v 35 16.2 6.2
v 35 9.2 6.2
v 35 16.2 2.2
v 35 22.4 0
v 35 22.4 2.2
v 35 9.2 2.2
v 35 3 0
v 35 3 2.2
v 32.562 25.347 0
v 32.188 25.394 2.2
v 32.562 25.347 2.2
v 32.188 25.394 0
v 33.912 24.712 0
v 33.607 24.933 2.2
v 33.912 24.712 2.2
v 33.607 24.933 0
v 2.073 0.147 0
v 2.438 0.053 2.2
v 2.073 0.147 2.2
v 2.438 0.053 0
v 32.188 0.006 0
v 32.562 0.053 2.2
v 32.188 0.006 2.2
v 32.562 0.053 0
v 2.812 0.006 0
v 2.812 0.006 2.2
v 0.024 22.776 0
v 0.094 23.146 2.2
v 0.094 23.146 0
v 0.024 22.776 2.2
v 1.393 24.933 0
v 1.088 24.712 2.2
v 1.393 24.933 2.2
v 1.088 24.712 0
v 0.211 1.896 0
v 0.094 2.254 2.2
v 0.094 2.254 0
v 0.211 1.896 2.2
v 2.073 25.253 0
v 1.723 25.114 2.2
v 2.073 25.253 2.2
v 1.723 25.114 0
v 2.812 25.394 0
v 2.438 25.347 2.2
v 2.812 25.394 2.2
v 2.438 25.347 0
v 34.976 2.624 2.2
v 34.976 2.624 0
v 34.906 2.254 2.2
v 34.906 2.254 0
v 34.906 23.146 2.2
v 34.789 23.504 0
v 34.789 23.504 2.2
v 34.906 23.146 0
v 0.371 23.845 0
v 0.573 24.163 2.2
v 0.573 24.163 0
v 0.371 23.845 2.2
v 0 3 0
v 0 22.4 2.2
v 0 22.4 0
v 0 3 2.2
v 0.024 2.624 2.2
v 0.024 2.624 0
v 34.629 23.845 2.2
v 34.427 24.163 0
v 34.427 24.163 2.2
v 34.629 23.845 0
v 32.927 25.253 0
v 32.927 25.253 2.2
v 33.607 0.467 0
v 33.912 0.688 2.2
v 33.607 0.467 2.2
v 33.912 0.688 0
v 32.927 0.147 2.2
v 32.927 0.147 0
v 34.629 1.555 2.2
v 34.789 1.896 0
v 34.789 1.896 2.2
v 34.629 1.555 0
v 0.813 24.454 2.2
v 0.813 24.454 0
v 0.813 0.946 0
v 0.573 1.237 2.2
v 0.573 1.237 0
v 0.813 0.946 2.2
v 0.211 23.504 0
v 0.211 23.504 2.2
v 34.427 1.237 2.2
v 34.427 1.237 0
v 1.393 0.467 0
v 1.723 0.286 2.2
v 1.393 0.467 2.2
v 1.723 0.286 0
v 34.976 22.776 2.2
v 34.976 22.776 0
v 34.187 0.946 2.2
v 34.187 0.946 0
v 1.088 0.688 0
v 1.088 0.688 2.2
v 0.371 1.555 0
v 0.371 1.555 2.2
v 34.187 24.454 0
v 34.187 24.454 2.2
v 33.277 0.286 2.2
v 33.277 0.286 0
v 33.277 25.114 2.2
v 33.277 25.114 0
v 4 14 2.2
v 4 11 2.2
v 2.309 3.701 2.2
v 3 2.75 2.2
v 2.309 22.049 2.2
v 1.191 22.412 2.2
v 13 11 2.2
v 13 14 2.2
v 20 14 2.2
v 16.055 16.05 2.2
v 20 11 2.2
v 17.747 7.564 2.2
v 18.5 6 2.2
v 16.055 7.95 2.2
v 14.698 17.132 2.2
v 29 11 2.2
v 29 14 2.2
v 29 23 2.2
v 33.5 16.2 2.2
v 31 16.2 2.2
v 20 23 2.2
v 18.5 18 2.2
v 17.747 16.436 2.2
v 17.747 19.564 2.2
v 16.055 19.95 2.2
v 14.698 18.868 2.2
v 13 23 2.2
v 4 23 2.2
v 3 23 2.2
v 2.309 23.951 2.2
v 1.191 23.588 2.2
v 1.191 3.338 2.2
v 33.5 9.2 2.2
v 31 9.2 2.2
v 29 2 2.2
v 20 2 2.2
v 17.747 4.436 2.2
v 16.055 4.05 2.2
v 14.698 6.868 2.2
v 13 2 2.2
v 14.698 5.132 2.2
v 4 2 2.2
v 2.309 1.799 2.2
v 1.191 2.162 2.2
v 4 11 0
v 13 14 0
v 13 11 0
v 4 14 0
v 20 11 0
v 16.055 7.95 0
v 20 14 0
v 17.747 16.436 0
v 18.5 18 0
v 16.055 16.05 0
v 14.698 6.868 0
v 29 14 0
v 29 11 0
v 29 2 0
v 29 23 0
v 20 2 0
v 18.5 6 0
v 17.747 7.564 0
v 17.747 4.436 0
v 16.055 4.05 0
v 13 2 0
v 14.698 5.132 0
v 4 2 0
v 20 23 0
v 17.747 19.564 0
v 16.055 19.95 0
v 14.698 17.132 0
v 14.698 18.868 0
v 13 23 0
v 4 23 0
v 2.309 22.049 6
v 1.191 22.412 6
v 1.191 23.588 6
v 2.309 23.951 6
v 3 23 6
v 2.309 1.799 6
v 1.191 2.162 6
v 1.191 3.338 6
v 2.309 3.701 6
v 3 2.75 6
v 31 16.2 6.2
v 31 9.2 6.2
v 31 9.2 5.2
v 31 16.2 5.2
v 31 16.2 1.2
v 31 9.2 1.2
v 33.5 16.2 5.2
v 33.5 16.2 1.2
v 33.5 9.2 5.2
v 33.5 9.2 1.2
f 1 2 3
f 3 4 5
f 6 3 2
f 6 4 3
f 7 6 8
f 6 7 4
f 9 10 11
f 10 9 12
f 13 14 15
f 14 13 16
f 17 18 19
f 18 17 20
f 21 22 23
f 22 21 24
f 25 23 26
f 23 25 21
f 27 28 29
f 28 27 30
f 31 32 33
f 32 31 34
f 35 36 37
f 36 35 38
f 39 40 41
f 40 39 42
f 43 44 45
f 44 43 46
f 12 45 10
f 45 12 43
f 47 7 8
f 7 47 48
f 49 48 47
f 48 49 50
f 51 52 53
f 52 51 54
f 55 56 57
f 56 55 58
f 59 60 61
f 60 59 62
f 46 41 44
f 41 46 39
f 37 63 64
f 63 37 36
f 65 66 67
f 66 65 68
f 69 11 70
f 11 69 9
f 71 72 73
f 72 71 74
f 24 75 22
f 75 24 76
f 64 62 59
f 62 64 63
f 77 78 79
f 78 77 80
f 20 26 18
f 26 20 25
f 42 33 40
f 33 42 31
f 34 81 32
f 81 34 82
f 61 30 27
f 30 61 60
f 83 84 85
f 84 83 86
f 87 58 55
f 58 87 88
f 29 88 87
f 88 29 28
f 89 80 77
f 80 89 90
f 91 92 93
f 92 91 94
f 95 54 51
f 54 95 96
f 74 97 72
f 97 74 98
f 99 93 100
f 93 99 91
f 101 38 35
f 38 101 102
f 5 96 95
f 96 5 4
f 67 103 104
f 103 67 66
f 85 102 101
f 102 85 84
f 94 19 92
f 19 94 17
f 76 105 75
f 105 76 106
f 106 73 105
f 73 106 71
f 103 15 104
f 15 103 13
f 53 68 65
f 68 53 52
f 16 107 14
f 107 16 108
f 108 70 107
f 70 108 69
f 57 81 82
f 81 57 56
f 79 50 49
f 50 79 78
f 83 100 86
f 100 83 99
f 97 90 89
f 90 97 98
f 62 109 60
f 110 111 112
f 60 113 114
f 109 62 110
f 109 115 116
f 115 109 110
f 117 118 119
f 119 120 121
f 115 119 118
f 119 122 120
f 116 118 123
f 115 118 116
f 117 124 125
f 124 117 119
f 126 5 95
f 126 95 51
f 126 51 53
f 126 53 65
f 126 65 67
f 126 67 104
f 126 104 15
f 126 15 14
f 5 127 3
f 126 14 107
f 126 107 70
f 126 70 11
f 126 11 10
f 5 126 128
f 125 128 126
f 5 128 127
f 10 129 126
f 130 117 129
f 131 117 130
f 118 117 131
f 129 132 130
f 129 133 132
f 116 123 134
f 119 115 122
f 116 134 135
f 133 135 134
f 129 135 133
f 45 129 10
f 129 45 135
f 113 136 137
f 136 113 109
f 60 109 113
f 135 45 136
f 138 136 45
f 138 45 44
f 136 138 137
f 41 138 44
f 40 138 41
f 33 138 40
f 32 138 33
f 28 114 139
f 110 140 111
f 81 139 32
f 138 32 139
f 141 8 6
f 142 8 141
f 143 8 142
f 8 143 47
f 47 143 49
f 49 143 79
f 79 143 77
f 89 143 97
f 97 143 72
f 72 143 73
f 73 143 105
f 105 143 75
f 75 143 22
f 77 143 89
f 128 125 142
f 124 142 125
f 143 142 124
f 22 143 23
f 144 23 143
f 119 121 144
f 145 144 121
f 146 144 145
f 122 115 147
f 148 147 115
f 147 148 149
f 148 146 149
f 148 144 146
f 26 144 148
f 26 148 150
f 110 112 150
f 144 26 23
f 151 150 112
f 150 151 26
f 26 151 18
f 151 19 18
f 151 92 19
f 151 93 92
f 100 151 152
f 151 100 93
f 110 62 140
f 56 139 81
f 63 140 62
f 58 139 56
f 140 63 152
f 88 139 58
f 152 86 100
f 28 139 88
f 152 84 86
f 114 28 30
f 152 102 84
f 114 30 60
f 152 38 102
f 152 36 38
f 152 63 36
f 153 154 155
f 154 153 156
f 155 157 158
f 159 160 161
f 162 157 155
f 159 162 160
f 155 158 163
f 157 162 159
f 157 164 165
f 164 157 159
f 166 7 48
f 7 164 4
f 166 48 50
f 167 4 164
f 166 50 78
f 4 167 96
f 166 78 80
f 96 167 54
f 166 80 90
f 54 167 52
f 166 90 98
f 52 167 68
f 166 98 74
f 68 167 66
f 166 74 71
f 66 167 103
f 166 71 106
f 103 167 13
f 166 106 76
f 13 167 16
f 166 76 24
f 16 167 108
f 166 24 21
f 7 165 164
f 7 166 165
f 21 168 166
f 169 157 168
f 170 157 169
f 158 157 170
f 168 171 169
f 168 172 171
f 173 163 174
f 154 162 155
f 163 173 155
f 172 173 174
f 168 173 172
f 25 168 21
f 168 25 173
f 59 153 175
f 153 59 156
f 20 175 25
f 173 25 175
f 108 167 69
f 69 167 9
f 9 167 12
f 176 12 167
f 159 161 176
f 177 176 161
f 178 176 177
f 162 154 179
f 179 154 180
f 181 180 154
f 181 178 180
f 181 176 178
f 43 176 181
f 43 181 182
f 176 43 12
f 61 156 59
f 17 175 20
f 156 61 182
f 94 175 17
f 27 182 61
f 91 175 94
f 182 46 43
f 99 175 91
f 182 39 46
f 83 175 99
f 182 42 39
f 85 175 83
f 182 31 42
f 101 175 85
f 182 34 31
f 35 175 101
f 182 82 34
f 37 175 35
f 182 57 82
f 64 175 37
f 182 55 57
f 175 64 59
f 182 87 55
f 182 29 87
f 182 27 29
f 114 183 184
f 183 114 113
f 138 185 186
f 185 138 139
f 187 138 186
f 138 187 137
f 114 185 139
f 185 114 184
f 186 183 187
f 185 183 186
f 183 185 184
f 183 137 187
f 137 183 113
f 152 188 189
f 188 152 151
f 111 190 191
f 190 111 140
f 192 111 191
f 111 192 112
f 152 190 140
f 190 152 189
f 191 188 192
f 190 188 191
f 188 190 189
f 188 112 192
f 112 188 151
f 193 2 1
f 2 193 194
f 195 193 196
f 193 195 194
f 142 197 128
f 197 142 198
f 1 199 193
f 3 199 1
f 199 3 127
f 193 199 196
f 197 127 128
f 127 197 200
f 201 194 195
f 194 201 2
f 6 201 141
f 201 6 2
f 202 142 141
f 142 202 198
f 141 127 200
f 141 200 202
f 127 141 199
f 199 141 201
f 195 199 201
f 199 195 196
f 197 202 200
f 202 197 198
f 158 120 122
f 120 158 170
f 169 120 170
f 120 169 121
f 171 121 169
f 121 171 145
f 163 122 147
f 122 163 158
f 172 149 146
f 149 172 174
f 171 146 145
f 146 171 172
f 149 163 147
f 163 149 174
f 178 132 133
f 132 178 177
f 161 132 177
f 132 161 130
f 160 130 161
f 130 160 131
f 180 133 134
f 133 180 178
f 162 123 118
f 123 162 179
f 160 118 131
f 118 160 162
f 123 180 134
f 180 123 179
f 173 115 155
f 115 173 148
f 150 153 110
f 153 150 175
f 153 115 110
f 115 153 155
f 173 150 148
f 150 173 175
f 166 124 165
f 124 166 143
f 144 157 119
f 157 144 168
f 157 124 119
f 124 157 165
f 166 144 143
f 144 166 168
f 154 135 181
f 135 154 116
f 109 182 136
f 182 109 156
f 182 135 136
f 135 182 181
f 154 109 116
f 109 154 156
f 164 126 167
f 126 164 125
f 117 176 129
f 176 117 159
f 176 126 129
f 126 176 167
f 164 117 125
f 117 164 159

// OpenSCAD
// Adafruit Ultimate GPS Breakout Mounting Cip 
//
//  I printed in PLA .4
//
//  Push the GPS board on the clip then onto the studs
//
//  This script used stuff 
//  I found on Thingiverse
//
//  Round corners for Openscad - Tutorial
//  by WilliamAAdams, published	 Jun 15, 2011
//  https://www.thingiverse.com/thing:9347
//


use <MCAD/boxes.scad>;
//cube([34,25.4,1.2]);
difference(){
union(){
    //base
		translate([3,3,0])
		miniround([35,25.4,1.2],3);

    //studs
    translate([2,23,0])
    cylinder(r=1,h=6);
    translate([2,2.75,0])
    cylinder(r=1,h=6);

		//clip
    translate([31,9.2,0])
		cube([4,7,6.2]);
}
    //hollow clip
		translate([31,9.2,1.2])
		cube([2.5,7,4]);

    //screw holes
    translate([16.5,6,0])
    cylinder(r=2,h=6);
    translate([16.5,18,0])
    cylinder(r=2,h=6);

    //reduce material
  	translate([4,2,0])
	  cube(9,14,2);
  	translate([20,2,0])
	  cube(9,14,2);
  	translate([4,14,0])
	  cube(9,18,2);
  	translate([20,14,0])
	  cube(9,18,2);

}


module miniround(size, radius)
{
$fn=50;
x = size[0]-radius*2;
y = size[1]-radius*2;

minkowski()
{
cube(size=[x,y,size[2]]);
cylinder(r=radius);
}
}

// end
